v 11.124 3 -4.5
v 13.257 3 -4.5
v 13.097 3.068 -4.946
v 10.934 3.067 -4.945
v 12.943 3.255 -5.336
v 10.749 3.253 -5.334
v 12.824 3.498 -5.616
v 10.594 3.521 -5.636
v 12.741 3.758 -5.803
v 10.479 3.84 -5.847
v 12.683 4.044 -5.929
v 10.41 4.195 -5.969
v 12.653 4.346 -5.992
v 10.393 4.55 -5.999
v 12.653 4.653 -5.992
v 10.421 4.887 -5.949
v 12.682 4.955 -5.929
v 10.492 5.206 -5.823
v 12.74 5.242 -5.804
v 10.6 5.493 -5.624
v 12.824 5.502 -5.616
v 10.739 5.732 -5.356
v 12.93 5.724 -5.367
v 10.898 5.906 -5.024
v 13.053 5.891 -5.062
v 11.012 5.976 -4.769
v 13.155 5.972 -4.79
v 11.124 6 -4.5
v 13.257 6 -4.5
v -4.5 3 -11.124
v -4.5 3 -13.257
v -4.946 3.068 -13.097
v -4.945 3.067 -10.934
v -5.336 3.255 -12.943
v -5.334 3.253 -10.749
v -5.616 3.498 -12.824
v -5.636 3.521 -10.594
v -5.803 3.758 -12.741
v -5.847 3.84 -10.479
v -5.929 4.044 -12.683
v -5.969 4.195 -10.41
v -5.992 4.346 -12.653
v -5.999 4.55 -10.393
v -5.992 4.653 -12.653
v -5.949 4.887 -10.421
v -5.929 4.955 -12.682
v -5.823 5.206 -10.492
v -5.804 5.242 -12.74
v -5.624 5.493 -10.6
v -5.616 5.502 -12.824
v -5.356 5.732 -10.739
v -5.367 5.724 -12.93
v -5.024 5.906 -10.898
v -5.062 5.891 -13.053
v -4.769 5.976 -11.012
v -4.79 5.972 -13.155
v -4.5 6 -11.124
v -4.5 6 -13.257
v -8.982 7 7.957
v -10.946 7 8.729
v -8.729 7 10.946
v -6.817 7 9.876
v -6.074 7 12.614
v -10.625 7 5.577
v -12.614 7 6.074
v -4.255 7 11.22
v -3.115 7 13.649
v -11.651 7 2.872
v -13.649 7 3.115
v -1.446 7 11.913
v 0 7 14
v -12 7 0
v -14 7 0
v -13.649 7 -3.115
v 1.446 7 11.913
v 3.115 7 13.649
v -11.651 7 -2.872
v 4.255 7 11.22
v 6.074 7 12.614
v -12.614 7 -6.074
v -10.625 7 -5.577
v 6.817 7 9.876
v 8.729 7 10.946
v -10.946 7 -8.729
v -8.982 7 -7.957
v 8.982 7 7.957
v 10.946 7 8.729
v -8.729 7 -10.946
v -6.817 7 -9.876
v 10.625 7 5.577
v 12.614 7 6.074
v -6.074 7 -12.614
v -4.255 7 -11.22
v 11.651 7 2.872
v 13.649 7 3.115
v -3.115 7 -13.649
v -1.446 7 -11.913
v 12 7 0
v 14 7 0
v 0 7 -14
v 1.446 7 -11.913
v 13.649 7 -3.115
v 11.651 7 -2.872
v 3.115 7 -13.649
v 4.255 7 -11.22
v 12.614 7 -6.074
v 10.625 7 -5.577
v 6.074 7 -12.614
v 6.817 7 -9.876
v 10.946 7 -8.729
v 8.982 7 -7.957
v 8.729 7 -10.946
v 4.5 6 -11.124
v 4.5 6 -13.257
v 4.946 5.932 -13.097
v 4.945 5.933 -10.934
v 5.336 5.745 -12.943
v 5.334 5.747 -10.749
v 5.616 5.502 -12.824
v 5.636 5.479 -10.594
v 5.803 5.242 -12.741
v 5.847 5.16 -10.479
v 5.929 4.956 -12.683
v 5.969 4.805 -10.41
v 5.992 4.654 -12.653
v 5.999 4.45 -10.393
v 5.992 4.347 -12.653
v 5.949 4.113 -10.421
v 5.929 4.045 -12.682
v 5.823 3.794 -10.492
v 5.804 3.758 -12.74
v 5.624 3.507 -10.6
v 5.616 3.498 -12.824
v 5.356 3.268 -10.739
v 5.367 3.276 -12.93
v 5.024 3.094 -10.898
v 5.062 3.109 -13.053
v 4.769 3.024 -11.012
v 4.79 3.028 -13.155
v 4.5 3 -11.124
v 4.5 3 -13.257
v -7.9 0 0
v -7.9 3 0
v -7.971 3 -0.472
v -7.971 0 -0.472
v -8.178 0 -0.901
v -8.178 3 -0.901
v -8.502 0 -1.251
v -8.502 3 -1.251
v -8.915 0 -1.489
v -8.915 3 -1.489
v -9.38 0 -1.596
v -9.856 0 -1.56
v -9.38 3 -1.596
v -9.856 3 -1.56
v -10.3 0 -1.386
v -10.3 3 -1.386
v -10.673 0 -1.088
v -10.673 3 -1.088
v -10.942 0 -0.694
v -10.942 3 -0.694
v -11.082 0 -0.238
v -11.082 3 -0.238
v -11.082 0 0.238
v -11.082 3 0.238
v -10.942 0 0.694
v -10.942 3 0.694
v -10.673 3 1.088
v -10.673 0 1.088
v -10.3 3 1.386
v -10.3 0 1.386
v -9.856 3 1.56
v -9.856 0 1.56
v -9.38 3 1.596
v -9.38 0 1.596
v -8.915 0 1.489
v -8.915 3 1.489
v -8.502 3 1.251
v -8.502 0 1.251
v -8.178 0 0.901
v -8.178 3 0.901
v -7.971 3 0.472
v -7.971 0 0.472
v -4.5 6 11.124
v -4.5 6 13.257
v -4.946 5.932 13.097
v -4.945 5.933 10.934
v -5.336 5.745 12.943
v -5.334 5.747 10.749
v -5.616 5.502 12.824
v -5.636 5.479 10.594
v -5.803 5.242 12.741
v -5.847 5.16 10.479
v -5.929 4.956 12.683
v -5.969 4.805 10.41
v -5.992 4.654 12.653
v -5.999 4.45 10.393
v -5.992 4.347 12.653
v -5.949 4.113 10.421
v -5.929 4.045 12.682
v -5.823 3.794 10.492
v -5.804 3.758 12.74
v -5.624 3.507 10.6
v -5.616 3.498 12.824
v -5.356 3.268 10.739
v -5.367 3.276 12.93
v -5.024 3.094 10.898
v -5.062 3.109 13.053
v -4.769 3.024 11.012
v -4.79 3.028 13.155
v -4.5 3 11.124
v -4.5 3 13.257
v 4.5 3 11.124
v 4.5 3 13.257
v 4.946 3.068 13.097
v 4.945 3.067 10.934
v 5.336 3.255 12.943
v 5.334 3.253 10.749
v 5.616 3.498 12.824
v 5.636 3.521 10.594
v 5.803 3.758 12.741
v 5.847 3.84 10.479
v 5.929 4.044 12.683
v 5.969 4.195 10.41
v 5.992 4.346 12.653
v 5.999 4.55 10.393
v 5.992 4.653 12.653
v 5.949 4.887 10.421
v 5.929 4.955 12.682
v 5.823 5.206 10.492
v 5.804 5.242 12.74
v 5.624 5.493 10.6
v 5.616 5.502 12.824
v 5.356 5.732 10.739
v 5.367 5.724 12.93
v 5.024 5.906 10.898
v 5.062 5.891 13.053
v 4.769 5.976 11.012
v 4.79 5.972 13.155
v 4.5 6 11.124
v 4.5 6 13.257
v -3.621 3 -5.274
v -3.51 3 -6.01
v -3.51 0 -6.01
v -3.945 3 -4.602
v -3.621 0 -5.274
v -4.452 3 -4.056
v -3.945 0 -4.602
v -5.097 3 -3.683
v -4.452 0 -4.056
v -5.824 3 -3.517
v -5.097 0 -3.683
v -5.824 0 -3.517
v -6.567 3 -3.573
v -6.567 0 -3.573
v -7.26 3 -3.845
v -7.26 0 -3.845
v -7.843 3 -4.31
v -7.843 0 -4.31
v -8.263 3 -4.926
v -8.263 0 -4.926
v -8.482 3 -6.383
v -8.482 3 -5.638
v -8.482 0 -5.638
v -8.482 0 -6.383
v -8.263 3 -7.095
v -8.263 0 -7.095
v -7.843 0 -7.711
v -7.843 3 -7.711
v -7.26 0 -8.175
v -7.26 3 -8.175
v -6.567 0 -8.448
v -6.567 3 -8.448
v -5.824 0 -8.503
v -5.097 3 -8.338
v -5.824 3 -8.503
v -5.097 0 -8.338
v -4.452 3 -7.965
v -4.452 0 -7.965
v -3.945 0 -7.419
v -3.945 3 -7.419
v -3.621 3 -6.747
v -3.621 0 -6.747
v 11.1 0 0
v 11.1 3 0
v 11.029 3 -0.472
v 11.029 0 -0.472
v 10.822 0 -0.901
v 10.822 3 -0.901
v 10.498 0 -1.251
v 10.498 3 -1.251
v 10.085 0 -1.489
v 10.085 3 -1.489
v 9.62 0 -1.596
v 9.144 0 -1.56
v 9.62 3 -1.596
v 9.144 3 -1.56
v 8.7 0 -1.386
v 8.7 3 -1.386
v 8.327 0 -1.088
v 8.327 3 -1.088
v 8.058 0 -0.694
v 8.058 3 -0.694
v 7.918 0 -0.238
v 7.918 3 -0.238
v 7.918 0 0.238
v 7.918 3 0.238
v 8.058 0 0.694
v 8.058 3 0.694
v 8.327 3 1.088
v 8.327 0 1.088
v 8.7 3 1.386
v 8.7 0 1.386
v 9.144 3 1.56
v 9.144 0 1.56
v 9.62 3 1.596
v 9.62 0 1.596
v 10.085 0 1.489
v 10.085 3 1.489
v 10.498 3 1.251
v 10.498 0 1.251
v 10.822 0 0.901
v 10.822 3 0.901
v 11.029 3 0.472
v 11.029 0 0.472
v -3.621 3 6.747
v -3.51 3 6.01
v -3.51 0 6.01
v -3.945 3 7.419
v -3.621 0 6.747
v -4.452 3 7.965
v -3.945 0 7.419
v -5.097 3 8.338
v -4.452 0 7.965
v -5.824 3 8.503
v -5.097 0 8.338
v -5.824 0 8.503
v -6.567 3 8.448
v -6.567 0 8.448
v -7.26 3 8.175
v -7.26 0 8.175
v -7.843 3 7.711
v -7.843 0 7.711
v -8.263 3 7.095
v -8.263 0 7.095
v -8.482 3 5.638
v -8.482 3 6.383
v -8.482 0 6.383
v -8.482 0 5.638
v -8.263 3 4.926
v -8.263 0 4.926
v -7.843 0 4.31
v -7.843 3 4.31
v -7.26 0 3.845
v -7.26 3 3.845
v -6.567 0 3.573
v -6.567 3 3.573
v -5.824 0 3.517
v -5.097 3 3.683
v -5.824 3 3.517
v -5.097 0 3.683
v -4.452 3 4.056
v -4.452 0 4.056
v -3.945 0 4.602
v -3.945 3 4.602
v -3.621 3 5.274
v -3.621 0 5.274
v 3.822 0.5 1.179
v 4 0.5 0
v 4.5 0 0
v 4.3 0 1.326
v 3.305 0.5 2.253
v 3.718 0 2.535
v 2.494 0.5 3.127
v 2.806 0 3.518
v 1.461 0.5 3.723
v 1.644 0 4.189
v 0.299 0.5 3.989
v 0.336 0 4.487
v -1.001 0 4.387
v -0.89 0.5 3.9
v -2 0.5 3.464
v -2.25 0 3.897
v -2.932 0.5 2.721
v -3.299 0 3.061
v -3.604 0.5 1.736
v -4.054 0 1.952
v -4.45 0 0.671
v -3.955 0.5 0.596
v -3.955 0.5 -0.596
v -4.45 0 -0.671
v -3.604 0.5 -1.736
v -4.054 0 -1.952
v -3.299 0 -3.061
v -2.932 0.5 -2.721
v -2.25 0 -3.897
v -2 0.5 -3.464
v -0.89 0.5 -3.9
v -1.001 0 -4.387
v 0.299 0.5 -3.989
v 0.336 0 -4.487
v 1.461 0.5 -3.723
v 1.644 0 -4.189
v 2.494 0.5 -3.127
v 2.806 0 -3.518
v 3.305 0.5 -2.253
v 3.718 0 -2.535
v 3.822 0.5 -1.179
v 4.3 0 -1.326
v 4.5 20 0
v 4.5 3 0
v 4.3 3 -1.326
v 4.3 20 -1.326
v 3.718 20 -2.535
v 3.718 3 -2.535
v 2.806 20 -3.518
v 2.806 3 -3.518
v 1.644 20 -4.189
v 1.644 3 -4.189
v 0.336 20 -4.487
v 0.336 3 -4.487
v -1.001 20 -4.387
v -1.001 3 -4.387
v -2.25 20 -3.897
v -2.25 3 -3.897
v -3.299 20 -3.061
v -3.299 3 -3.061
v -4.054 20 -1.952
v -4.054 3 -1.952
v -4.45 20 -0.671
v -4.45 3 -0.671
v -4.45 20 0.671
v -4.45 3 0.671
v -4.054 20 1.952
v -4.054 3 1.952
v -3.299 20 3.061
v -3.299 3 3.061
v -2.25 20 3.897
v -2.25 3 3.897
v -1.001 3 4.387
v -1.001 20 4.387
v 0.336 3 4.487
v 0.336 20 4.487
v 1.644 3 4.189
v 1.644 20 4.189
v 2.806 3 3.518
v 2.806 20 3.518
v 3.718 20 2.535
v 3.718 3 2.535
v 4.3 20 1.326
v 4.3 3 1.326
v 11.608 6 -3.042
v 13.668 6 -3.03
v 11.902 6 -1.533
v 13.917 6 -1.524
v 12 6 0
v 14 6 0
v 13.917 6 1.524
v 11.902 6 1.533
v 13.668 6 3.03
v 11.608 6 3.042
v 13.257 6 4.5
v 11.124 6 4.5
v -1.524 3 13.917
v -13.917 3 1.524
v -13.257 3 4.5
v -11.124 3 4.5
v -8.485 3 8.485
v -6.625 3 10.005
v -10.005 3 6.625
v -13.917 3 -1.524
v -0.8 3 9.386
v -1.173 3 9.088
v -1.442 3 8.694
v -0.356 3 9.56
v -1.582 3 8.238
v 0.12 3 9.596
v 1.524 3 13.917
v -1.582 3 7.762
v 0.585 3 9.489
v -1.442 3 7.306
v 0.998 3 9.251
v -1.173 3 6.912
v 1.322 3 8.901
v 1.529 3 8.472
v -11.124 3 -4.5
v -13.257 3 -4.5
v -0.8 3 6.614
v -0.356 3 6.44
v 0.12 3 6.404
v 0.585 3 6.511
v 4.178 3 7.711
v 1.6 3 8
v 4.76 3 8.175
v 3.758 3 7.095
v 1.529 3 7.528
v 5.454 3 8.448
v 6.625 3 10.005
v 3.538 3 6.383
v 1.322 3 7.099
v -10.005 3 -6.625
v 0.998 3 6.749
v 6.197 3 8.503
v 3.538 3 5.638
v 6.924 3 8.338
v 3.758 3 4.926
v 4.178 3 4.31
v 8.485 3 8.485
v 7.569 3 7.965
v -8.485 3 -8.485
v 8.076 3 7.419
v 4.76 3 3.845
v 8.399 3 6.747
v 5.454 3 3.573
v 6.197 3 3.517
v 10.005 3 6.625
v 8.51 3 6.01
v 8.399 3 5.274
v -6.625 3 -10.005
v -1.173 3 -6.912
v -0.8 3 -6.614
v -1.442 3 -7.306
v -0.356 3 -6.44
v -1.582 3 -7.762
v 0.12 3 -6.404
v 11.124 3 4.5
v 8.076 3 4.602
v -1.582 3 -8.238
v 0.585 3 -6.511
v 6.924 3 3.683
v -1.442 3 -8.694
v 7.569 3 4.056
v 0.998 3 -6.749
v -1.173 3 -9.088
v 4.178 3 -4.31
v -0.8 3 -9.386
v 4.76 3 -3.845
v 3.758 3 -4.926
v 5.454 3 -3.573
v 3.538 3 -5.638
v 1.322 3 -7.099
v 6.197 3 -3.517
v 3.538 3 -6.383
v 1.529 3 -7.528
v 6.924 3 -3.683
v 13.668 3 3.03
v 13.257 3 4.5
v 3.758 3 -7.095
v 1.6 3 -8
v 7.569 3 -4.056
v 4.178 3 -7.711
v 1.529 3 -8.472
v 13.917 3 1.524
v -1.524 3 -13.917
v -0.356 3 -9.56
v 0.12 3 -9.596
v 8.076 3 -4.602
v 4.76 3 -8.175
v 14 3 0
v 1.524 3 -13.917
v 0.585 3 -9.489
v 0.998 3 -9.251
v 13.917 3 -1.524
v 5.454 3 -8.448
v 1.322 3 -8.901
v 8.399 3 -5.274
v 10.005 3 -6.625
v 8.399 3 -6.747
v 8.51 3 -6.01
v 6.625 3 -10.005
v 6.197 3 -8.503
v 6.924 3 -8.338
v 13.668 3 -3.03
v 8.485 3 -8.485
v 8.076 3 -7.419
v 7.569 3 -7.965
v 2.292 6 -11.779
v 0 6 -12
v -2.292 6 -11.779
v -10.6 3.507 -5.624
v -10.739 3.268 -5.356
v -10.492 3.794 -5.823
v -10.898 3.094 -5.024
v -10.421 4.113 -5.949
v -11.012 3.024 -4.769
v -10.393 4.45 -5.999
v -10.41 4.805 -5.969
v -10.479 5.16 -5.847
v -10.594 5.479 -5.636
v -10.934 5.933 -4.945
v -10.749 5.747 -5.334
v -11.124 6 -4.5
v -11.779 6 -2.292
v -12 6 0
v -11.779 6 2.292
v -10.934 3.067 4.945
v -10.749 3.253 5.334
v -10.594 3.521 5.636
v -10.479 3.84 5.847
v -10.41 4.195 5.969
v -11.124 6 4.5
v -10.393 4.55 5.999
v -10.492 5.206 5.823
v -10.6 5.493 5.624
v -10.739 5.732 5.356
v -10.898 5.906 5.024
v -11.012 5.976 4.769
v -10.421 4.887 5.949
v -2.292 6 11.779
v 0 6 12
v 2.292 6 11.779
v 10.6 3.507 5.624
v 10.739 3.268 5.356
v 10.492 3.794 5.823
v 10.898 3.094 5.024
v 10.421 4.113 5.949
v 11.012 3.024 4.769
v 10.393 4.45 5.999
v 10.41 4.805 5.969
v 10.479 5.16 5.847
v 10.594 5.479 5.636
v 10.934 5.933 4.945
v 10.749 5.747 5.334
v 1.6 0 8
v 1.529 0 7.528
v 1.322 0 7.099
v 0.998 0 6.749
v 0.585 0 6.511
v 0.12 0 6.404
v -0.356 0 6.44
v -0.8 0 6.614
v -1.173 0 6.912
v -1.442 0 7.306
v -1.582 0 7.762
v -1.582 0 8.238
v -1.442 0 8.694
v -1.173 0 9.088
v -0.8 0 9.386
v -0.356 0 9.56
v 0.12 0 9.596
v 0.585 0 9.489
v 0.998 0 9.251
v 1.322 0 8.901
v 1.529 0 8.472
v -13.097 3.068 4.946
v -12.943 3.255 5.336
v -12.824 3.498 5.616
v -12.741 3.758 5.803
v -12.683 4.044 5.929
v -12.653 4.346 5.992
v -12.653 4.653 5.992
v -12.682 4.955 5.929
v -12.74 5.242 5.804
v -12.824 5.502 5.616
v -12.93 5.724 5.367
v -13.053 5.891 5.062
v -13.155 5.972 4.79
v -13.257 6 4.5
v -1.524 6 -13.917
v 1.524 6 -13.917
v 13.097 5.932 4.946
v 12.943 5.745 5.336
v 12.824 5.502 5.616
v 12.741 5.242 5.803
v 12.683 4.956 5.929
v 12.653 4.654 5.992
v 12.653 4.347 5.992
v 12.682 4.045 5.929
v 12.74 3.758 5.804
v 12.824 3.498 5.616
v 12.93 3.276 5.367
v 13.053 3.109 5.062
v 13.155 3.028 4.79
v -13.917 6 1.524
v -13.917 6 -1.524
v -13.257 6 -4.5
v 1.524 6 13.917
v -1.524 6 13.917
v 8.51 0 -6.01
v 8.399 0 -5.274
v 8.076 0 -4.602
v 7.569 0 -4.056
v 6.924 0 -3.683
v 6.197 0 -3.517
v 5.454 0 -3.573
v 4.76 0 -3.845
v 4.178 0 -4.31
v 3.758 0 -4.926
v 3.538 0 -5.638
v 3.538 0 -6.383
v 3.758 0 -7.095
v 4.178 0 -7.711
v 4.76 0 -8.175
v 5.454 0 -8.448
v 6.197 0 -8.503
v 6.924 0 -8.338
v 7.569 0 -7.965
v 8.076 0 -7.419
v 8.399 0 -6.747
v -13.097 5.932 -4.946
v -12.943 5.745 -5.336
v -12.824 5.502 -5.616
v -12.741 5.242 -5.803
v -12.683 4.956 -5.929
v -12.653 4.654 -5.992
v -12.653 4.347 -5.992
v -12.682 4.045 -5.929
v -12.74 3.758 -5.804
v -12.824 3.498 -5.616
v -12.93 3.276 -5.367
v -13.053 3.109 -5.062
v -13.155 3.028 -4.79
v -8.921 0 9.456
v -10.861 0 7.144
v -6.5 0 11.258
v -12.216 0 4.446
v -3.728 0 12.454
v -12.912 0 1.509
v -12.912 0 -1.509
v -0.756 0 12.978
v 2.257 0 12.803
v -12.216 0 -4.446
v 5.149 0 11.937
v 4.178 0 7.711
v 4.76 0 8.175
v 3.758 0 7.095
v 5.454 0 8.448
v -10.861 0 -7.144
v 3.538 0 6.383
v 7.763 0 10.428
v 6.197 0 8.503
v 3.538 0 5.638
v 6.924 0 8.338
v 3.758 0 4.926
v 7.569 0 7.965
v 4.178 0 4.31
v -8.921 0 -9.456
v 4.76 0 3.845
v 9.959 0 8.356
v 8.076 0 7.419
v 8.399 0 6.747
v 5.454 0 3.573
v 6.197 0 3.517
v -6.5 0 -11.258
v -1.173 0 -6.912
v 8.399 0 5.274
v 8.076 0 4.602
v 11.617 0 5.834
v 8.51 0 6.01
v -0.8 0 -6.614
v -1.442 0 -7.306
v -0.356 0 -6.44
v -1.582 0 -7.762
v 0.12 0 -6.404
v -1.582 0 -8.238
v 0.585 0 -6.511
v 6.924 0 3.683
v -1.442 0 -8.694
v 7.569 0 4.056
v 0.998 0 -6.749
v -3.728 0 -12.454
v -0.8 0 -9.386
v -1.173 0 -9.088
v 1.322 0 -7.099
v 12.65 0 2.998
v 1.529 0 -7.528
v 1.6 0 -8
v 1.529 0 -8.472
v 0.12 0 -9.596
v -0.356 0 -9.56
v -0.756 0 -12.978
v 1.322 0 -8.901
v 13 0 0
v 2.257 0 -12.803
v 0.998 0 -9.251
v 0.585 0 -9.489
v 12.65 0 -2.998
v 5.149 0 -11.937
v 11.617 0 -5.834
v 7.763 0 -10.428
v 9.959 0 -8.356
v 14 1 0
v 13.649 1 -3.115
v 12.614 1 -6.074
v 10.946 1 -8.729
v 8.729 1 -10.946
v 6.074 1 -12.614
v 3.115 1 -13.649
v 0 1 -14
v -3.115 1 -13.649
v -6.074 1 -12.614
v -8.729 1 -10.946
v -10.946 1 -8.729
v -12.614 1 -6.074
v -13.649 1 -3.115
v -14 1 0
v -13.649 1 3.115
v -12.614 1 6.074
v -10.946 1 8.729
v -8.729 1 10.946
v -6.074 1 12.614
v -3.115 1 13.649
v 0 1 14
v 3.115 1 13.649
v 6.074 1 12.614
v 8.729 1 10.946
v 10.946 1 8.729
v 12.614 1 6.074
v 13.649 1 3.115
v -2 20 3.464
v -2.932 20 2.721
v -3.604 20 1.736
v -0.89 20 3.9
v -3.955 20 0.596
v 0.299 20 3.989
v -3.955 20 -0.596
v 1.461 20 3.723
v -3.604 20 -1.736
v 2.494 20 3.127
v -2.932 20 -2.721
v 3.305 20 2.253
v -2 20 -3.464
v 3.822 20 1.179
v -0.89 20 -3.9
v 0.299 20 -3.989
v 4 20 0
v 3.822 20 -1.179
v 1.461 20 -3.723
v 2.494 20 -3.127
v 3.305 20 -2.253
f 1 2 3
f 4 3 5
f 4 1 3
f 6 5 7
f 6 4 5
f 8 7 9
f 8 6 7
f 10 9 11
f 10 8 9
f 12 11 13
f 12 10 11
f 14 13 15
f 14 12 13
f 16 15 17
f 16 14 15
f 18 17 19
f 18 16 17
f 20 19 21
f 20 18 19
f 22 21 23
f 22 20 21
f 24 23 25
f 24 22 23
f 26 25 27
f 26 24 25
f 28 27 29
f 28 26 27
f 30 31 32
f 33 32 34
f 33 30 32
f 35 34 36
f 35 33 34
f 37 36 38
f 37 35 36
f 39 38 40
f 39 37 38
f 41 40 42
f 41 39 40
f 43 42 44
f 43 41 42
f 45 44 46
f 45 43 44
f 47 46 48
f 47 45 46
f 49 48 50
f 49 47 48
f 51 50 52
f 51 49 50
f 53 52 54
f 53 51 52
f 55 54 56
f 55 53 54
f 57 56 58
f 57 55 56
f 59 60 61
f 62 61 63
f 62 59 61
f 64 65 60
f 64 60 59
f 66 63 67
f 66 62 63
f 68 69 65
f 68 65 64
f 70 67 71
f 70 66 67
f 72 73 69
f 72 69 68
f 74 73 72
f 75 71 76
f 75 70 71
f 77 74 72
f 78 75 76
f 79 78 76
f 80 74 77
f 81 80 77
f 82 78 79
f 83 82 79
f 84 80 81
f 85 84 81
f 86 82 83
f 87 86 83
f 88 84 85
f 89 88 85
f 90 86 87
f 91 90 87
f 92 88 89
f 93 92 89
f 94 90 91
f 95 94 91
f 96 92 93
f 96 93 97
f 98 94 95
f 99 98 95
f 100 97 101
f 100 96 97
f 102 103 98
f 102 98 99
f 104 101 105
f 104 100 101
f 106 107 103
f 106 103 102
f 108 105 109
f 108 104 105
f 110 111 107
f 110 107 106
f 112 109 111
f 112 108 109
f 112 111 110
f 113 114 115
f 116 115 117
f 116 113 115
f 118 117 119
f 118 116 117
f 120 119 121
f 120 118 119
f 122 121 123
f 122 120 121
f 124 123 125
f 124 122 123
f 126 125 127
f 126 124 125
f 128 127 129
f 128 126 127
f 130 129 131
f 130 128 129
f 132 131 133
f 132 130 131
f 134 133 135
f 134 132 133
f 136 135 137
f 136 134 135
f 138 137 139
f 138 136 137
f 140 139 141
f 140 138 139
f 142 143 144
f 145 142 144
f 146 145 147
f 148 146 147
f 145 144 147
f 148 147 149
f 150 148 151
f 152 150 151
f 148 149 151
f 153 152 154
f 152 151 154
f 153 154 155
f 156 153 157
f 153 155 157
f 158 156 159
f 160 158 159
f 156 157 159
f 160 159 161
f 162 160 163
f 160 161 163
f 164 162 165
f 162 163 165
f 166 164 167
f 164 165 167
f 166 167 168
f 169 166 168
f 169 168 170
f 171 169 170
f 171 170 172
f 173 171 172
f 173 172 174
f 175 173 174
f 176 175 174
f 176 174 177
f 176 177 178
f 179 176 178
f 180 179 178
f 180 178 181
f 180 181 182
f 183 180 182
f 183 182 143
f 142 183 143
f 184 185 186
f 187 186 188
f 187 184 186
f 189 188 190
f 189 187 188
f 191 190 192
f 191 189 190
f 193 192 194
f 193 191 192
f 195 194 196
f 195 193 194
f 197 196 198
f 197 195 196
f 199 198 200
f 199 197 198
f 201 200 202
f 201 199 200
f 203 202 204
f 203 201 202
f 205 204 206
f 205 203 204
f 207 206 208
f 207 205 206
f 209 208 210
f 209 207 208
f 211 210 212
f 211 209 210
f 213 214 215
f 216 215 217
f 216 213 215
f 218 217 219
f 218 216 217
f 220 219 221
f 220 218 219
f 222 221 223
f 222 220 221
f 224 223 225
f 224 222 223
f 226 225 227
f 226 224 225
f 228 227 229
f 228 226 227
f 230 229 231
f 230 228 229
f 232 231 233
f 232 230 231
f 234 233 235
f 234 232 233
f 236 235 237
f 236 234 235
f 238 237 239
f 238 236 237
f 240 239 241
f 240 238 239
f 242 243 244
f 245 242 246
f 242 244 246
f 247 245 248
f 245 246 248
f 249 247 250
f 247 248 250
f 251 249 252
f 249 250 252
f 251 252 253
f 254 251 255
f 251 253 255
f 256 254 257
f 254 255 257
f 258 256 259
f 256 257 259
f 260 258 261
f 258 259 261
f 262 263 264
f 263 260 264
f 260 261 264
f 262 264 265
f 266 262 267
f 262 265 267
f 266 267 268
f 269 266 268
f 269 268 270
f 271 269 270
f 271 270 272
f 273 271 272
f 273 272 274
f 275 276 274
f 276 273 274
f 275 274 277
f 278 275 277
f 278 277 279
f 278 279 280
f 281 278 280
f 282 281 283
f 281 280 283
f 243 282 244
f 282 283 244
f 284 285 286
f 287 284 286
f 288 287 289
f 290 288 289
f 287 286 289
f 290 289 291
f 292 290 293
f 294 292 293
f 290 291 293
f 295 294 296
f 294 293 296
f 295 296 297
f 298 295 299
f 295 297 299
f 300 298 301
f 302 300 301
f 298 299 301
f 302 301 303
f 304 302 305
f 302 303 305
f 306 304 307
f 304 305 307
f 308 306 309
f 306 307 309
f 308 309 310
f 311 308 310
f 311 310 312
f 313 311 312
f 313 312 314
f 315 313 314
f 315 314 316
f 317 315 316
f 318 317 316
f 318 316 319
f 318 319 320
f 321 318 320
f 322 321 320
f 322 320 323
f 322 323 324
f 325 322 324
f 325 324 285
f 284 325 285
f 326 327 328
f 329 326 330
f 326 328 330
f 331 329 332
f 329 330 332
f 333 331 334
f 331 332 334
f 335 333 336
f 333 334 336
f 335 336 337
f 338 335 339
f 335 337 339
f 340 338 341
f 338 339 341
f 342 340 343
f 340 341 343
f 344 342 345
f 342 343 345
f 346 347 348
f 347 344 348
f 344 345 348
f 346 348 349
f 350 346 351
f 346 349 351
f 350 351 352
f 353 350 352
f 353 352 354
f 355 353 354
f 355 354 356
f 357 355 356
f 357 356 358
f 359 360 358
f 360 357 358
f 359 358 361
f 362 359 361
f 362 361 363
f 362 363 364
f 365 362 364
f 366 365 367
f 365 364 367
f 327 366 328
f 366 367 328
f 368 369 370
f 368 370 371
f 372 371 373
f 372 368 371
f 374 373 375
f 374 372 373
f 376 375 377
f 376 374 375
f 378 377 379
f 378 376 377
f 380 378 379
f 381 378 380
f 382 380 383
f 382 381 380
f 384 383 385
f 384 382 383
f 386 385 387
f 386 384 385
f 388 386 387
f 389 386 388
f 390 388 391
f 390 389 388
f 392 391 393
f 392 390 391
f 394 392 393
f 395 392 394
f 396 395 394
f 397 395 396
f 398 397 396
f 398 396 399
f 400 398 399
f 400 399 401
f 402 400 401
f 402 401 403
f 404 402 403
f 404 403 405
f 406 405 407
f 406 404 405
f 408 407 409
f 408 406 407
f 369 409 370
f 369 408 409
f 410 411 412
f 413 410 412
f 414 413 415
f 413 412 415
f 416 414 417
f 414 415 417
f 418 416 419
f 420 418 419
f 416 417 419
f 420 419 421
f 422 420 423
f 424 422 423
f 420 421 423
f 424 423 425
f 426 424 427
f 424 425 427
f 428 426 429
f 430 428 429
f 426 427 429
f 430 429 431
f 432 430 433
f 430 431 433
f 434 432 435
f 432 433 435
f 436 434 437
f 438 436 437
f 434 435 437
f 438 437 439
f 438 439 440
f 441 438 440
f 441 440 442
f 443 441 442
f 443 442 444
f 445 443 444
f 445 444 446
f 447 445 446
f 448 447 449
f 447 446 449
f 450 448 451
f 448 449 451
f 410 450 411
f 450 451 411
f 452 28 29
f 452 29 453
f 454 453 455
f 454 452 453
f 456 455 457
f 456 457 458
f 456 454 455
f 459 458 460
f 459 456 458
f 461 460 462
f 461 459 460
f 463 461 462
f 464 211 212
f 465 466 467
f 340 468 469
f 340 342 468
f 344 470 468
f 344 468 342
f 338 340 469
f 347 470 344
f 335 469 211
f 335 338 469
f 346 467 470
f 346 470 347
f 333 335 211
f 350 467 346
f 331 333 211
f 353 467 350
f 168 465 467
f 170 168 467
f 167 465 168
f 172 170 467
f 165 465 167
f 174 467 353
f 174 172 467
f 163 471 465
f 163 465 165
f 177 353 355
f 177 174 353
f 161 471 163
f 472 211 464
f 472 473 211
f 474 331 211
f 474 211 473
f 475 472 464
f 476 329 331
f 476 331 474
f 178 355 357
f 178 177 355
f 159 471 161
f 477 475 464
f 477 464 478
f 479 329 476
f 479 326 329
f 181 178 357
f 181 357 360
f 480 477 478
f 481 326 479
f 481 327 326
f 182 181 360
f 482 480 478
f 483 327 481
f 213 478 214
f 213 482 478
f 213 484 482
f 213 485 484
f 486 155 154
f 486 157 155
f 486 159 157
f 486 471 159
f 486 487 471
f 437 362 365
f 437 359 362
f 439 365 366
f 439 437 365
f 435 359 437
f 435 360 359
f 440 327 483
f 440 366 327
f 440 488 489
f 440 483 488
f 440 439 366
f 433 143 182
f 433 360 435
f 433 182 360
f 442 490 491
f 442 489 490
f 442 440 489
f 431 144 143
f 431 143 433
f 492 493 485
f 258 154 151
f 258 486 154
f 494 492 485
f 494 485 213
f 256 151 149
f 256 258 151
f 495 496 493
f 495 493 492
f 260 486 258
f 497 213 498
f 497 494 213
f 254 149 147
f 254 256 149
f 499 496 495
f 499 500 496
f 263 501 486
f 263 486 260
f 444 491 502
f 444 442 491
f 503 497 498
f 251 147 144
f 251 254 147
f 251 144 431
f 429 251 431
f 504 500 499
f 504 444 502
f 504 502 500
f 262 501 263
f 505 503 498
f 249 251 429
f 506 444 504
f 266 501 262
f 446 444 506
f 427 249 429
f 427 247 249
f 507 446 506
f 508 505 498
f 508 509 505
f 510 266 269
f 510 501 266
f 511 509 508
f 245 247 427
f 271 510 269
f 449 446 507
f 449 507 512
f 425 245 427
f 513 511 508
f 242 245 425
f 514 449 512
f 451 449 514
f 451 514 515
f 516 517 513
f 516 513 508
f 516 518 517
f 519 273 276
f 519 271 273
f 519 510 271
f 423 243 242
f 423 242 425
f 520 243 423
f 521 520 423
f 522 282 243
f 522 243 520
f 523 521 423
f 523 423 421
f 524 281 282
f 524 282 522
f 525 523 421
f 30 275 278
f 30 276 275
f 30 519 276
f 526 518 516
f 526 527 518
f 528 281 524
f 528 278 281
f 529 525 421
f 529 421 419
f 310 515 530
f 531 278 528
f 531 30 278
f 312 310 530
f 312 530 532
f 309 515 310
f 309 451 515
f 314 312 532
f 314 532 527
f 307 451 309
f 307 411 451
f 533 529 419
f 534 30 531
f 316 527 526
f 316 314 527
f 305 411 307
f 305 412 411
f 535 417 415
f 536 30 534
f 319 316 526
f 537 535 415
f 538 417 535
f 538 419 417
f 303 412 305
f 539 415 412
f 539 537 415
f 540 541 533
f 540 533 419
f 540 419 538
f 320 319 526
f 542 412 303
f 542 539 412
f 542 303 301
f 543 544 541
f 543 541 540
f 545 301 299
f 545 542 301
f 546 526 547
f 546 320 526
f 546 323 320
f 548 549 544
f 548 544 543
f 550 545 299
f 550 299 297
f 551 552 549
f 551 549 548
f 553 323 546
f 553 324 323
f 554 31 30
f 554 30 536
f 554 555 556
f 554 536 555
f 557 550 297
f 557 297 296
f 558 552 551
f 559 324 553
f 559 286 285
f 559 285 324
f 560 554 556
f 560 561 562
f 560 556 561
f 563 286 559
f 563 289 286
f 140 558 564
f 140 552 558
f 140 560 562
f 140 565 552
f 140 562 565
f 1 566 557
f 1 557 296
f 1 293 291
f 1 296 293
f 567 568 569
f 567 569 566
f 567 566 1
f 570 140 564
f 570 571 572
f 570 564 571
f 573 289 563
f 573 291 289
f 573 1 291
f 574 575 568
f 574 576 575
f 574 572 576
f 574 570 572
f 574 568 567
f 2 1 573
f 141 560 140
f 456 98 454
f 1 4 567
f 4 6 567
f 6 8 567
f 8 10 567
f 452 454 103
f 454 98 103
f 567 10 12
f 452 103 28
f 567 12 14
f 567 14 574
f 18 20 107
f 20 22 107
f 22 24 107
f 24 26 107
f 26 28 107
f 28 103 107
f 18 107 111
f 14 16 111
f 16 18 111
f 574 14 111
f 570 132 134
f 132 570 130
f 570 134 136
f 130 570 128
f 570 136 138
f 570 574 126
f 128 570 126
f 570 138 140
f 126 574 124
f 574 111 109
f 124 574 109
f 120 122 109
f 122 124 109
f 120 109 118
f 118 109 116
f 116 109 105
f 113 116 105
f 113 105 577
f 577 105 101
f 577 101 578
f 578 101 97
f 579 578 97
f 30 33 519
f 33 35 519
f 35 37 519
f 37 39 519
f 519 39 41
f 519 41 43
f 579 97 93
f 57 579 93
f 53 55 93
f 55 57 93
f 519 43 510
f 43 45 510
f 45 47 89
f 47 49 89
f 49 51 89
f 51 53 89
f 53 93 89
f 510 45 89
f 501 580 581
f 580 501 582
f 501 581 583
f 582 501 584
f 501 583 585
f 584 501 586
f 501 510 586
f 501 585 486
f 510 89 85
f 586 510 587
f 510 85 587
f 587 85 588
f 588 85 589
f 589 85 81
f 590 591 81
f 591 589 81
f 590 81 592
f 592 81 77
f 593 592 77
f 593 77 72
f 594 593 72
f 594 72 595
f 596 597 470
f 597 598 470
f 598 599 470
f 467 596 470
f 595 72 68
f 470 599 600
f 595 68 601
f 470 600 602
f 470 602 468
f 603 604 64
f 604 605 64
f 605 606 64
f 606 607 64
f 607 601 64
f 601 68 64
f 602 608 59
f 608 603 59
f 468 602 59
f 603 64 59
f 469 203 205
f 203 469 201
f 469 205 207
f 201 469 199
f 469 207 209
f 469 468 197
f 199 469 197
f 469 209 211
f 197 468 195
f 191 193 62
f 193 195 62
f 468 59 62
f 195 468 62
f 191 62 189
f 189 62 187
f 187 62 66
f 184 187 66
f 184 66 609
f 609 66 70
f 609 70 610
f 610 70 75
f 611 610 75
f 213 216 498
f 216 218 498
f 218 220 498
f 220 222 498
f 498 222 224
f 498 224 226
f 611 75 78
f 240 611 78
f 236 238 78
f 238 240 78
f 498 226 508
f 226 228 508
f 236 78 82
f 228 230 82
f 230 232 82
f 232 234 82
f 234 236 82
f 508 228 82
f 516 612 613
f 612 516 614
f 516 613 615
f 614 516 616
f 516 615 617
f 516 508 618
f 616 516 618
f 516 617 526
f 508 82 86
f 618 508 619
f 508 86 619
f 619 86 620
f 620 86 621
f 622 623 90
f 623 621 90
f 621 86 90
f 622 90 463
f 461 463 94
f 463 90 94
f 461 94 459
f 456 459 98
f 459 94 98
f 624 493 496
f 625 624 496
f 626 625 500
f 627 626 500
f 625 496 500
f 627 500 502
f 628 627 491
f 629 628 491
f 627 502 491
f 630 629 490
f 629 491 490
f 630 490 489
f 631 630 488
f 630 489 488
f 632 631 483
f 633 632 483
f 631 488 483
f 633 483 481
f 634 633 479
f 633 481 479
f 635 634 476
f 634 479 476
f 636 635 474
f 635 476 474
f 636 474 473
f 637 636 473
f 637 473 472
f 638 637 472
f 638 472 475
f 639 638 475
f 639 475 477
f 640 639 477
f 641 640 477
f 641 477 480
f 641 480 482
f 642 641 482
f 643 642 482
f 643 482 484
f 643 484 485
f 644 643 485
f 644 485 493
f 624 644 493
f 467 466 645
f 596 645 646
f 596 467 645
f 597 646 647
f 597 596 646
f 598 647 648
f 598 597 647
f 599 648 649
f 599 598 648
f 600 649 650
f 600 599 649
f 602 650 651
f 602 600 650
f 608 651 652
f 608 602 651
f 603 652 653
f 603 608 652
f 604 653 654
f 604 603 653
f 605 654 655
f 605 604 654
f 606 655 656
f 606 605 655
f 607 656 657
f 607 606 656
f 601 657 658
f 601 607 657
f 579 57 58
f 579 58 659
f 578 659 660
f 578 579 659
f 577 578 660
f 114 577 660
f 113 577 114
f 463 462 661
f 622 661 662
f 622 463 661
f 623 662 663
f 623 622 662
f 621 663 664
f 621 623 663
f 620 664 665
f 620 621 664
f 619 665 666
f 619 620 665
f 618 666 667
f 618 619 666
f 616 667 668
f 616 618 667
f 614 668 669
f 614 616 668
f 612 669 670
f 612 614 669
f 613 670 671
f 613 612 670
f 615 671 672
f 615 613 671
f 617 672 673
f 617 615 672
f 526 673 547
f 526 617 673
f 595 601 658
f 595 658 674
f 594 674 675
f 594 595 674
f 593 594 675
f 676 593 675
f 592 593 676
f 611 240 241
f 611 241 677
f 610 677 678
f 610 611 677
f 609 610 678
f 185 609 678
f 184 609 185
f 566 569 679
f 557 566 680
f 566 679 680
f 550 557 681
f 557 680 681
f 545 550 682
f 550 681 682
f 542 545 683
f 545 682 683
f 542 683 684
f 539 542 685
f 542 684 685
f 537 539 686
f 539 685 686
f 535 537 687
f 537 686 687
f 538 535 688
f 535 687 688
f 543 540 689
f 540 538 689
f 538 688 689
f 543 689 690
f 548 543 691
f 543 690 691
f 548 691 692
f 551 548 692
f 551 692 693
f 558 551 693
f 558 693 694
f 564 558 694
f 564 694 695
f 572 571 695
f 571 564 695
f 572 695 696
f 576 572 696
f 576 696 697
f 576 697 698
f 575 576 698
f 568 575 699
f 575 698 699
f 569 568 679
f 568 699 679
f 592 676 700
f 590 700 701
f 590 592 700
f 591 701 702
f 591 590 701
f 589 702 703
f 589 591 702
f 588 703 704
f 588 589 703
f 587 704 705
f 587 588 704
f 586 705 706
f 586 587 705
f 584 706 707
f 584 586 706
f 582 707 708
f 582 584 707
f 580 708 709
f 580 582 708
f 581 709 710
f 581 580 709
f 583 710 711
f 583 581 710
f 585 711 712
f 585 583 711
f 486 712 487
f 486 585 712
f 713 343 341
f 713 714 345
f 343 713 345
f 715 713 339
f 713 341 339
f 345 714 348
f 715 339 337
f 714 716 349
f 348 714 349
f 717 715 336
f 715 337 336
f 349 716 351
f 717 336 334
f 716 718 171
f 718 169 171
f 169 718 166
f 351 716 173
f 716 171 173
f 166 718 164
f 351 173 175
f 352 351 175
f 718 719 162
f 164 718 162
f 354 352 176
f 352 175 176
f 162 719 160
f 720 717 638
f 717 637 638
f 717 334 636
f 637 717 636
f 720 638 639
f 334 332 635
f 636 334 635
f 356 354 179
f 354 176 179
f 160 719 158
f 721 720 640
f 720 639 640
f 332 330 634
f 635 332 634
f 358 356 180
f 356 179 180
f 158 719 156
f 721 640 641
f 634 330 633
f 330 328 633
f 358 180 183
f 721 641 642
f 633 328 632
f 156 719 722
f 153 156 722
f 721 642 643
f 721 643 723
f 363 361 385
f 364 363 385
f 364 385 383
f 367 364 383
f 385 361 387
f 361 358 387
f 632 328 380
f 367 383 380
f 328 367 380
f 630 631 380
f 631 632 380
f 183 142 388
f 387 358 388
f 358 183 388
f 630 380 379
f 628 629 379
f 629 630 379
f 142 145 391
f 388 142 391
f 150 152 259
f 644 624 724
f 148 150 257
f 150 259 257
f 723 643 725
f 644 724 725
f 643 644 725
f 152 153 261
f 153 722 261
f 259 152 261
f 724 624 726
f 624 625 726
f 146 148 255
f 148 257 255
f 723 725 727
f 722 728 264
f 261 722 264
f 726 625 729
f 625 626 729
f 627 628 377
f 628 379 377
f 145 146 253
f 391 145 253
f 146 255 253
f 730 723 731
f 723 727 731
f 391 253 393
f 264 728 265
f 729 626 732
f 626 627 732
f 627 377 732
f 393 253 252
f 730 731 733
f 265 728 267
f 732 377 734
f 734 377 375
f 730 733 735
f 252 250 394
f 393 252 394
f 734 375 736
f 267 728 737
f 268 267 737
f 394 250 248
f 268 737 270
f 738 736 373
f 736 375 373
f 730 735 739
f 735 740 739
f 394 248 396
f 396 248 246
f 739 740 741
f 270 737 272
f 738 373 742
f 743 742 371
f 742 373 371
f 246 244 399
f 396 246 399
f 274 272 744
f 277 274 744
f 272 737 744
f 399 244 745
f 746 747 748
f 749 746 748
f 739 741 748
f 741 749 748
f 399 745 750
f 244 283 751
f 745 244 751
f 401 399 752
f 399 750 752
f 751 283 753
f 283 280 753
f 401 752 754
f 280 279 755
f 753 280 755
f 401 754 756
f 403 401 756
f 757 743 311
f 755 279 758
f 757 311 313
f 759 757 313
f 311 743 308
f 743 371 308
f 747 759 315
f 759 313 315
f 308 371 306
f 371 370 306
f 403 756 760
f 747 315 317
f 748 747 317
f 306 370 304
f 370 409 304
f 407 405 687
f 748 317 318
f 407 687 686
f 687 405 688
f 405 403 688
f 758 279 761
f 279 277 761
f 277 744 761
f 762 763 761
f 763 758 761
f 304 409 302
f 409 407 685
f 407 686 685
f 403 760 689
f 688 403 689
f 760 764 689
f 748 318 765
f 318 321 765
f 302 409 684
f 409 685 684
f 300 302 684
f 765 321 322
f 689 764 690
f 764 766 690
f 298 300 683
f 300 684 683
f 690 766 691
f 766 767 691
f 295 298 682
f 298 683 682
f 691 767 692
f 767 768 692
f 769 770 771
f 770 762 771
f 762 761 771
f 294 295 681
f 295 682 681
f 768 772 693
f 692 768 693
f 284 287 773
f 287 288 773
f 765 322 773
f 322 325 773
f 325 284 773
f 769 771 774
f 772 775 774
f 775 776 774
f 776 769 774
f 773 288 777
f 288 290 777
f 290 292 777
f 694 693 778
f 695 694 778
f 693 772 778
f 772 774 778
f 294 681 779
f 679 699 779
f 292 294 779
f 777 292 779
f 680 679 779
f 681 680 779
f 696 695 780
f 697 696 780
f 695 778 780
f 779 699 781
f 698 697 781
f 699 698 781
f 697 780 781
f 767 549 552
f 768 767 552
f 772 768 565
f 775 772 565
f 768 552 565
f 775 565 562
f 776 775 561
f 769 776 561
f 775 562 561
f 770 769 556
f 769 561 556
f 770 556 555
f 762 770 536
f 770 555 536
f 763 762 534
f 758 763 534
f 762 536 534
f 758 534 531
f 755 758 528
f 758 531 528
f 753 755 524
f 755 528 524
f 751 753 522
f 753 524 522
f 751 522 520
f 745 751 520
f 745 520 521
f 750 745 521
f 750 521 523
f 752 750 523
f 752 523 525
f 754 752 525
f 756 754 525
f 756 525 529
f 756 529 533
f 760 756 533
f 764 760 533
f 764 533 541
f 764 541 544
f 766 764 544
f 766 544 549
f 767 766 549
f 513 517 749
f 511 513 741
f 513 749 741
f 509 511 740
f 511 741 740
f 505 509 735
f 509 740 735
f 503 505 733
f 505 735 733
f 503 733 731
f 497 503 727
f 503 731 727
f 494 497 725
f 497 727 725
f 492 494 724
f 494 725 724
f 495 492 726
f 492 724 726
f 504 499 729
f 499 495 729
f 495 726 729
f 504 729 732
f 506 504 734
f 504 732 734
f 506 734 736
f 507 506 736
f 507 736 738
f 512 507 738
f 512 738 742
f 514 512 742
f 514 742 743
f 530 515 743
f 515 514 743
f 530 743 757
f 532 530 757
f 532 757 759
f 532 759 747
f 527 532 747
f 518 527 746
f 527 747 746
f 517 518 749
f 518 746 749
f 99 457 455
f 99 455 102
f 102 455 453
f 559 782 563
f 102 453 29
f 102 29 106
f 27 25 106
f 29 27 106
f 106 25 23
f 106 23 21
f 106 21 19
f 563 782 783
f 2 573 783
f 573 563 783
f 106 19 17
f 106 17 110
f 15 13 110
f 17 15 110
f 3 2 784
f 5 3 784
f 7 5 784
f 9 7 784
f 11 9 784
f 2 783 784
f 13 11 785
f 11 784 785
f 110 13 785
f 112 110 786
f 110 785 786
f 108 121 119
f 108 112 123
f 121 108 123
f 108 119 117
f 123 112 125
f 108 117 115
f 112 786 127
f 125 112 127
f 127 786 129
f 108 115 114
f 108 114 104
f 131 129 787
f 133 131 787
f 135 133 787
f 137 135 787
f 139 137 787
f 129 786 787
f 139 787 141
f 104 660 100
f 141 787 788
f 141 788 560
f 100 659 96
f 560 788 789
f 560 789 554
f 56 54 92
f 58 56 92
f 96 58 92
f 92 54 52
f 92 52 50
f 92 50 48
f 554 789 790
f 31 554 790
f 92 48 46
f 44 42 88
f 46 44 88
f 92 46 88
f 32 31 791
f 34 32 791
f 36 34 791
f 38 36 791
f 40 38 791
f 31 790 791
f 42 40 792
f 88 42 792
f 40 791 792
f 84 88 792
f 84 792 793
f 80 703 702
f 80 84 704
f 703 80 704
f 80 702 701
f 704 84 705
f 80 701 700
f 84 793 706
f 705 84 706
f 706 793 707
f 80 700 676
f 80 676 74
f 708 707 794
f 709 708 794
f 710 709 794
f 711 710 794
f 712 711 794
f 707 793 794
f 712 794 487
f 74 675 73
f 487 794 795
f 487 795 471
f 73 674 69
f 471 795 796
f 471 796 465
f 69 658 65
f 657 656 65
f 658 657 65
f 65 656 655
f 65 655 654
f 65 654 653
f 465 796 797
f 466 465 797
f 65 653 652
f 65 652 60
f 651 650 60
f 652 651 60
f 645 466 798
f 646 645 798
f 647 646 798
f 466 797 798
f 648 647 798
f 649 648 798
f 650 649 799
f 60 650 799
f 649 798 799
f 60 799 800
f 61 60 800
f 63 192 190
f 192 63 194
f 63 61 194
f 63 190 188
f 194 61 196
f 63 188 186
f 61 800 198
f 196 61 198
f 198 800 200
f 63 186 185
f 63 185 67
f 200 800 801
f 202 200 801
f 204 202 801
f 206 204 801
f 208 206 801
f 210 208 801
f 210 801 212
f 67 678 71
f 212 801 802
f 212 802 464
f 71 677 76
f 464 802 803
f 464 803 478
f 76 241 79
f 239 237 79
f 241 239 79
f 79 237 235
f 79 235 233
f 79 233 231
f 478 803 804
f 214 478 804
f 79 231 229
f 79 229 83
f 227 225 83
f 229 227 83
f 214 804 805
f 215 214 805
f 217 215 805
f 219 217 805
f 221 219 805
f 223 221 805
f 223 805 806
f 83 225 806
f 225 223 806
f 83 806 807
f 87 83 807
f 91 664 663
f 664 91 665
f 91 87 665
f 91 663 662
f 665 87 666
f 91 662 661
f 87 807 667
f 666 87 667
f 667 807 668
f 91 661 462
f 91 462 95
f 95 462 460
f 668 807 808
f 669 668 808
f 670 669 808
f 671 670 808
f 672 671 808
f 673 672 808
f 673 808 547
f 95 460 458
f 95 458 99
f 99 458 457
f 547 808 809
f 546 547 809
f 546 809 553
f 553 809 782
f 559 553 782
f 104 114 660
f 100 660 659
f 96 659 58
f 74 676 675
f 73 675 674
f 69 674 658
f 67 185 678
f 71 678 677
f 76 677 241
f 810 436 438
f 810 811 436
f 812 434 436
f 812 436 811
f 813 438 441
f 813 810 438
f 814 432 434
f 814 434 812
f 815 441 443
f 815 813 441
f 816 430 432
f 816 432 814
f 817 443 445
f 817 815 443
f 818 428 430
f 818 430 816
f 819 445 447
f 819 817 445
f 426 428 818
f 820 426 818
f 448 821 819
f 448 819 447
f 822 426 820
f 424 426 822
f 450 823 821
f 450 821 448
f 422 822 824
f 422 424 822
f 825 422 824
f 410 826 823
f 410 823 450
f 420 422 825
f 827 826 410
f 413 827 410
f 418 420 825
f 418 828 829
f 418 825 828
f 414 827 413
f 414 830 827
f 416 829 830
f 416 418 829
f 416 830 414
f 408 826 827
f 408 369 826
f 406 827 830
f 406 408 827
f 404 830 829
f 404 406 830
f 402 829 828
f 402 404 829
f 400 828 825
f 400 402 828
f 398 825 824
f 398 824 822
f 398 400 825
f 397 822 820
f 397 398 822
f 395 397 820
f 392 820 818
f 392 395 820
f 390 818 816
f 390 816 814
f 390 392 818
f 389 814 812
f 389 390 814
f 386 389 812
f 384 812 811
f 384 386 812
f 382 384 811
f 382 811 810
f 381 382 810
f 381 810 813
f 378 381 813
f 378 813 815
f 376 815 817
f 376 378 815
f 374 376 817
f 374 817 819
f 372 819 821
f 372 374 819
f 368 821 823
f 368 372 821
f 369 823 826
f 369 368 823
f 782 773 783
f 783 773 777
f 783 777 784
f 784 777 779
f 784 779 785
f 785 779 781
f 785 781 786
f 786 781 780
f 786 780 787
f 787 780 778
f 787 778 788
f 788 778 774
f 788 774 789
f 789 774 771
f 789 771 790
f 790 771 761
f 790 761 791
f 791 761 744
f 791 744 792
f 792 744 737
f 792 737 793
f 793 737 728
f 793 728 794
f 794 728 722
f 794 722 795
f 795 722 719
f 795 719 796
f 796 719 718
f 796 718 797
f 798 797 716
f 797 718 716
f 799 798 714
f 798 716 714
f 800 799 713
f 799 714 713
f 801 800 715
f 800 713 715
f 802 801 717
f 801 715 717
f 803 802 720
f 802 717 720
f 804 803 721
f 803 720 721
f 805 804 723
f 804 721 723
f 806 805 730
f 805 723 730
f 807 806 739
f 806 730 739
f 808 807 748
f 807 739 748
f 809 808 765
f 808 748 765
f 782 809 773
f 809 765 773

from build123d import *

# Parameters (mm, degrees)
SKETCH1_R            = 14
BOSS_EXTRUDE1_DEPTH  = 7
CHAMFER1_SIZE        = 1
SKETCH11_R           = 12
CUT_EXTRUDE3_DEPTH   = 4
M3_CLEARANCE_HOLE2_D = 3.2
SKETCH2_R            = 4
SKETCH2_R_2          = 2.5
CUT_EXTRUDE4_DEPTH   = 3
CHAMFER2_SIZE        = 0.5
CUT_EXTRUDE2_DEPTH   = 14
CIRPATTERN1_COUNT    = 4
SKETCH12_R           = 4.5
SKETCH12_R_2         = 4
BOSS_EXTRUDE3_DEPTH  = 17


with BuildPart() as part:
    # Sketch1 → Boss-Extrude1 (new body)
    with BuildSketch(Plane(origin=(0, 0, 0), x_dir=(1, 0, 0), z_dir=(0, 1, 0))):
        Circle(SKETCH1_R)
    extrude(amount=BOSS_EXTRUDE1_DEPTH)

    # Chamfer1
    chamfer1_edges = [part.edges().sort_by_distance(p)[0] for p in [
        (-14, 0, 0),
    ]]
    chamfer(chamfer1_edges, length=CHAMFER1_SIZE)

    # Sketch11 → Cut-Extrude3 (cut)
    with BuildSketch(Plane(origin=(0, 7, 0), x_dir=(1, 0, 0), z_dir=(0, 1, 0))):
        Circle(SKETCH11_R)
    extrude(amount=-CUT_EXTRUDE3_DEPTH, mode=Mode.SUBTRACT)

    # M3 Clearance Hole2 (through all)
    with Locations(Plane(origin=(0, 0, 0), x_dir=(-1, 0, 0), z_dir=(0, -1, 0))):
        with Locations((9.5, 0), (-9.5, 0), (0, 8), (0, -8)):
            Hole(M3_CLEARANCE_HOLE2_D / 2)

    # Sketch2 → Cut-Extrude4 (cut)
    with BuildSketch(Plane.XZ):
        Circle(SKETCH2_R)
        with Locations((6.01040764, 6.01040764)):
            Circle(SKETCH2_R_2)
        with Locations((6.01040764, -6.01040764)):
            Circle(SKETCH2_R_2)
        with Locations((-6.01040764, -6.01040764)):
            Circle(SKETCH2_R_2)
        with Locations((-6.01040764, 6.01040764)):
            Circle(SKETCH2_R_2)
    extrude(amount=-CUT_EXTRUDE4_DEPTH, mode=Mode.SUBTRACT)

    # Chamfer2
    chamfer2_edges = [part.edges().sort_by_distance(p)[0] for p in [
        (-4, 0, 0),
    ]]
    chamfer(chamfer2_edges, length=CHAMFER2_SIZE)

    # Sketch10 → Cut-Extrude2 (cut)
    with BuildSketch(Plane(origin=(0, 0, 0), x_dir=(0, 0, -1), z_dir=(1, 0, 0))):
        with BuildLine():
            Line((-4.5, 6), (4.5, 6))
            ThreePointArc((4.5, 6), (6, 4.5), (4.5, 3))
            Line((4.5, 3), (-4.5, 3))
            ThreePointArc((-4.5, 3), (-6, 4.5), (-4.5, 6))
        make_face()
    cut_extrude2 = extrude(amount=-CUT_EXTRUDE2_DEPTH, mode=Mode.SUBTRACT)

    # CirPattern1: Cut-Extrude2 ×4 about axis
    cirpattern1_axis = Axis((0, 3, 0), (0, 1, 0))
    for i in range(1, CIRPATTERN1_COUNT):
        add(cut_extrude2.rotate(cirpattern1_axis, i * 360 / CIRPATTERN1_COUNT), mode=Mode.SUBTRACT)

    # Sketch12 → Boss-Extrude3 (add)
    with BuildSketch(Plane(origin=(0, 3, 0), x_dir=(1, 0, 0), z_dir=(0, 1, 0))):
        Circle(SKETCH12_R)
        Circle(SKETCH12_R_2, mode=Mode.SUBTRACT)
    extrude(amount=BOSS_EXTRUDE3_DEPTH)


solid = part.part
